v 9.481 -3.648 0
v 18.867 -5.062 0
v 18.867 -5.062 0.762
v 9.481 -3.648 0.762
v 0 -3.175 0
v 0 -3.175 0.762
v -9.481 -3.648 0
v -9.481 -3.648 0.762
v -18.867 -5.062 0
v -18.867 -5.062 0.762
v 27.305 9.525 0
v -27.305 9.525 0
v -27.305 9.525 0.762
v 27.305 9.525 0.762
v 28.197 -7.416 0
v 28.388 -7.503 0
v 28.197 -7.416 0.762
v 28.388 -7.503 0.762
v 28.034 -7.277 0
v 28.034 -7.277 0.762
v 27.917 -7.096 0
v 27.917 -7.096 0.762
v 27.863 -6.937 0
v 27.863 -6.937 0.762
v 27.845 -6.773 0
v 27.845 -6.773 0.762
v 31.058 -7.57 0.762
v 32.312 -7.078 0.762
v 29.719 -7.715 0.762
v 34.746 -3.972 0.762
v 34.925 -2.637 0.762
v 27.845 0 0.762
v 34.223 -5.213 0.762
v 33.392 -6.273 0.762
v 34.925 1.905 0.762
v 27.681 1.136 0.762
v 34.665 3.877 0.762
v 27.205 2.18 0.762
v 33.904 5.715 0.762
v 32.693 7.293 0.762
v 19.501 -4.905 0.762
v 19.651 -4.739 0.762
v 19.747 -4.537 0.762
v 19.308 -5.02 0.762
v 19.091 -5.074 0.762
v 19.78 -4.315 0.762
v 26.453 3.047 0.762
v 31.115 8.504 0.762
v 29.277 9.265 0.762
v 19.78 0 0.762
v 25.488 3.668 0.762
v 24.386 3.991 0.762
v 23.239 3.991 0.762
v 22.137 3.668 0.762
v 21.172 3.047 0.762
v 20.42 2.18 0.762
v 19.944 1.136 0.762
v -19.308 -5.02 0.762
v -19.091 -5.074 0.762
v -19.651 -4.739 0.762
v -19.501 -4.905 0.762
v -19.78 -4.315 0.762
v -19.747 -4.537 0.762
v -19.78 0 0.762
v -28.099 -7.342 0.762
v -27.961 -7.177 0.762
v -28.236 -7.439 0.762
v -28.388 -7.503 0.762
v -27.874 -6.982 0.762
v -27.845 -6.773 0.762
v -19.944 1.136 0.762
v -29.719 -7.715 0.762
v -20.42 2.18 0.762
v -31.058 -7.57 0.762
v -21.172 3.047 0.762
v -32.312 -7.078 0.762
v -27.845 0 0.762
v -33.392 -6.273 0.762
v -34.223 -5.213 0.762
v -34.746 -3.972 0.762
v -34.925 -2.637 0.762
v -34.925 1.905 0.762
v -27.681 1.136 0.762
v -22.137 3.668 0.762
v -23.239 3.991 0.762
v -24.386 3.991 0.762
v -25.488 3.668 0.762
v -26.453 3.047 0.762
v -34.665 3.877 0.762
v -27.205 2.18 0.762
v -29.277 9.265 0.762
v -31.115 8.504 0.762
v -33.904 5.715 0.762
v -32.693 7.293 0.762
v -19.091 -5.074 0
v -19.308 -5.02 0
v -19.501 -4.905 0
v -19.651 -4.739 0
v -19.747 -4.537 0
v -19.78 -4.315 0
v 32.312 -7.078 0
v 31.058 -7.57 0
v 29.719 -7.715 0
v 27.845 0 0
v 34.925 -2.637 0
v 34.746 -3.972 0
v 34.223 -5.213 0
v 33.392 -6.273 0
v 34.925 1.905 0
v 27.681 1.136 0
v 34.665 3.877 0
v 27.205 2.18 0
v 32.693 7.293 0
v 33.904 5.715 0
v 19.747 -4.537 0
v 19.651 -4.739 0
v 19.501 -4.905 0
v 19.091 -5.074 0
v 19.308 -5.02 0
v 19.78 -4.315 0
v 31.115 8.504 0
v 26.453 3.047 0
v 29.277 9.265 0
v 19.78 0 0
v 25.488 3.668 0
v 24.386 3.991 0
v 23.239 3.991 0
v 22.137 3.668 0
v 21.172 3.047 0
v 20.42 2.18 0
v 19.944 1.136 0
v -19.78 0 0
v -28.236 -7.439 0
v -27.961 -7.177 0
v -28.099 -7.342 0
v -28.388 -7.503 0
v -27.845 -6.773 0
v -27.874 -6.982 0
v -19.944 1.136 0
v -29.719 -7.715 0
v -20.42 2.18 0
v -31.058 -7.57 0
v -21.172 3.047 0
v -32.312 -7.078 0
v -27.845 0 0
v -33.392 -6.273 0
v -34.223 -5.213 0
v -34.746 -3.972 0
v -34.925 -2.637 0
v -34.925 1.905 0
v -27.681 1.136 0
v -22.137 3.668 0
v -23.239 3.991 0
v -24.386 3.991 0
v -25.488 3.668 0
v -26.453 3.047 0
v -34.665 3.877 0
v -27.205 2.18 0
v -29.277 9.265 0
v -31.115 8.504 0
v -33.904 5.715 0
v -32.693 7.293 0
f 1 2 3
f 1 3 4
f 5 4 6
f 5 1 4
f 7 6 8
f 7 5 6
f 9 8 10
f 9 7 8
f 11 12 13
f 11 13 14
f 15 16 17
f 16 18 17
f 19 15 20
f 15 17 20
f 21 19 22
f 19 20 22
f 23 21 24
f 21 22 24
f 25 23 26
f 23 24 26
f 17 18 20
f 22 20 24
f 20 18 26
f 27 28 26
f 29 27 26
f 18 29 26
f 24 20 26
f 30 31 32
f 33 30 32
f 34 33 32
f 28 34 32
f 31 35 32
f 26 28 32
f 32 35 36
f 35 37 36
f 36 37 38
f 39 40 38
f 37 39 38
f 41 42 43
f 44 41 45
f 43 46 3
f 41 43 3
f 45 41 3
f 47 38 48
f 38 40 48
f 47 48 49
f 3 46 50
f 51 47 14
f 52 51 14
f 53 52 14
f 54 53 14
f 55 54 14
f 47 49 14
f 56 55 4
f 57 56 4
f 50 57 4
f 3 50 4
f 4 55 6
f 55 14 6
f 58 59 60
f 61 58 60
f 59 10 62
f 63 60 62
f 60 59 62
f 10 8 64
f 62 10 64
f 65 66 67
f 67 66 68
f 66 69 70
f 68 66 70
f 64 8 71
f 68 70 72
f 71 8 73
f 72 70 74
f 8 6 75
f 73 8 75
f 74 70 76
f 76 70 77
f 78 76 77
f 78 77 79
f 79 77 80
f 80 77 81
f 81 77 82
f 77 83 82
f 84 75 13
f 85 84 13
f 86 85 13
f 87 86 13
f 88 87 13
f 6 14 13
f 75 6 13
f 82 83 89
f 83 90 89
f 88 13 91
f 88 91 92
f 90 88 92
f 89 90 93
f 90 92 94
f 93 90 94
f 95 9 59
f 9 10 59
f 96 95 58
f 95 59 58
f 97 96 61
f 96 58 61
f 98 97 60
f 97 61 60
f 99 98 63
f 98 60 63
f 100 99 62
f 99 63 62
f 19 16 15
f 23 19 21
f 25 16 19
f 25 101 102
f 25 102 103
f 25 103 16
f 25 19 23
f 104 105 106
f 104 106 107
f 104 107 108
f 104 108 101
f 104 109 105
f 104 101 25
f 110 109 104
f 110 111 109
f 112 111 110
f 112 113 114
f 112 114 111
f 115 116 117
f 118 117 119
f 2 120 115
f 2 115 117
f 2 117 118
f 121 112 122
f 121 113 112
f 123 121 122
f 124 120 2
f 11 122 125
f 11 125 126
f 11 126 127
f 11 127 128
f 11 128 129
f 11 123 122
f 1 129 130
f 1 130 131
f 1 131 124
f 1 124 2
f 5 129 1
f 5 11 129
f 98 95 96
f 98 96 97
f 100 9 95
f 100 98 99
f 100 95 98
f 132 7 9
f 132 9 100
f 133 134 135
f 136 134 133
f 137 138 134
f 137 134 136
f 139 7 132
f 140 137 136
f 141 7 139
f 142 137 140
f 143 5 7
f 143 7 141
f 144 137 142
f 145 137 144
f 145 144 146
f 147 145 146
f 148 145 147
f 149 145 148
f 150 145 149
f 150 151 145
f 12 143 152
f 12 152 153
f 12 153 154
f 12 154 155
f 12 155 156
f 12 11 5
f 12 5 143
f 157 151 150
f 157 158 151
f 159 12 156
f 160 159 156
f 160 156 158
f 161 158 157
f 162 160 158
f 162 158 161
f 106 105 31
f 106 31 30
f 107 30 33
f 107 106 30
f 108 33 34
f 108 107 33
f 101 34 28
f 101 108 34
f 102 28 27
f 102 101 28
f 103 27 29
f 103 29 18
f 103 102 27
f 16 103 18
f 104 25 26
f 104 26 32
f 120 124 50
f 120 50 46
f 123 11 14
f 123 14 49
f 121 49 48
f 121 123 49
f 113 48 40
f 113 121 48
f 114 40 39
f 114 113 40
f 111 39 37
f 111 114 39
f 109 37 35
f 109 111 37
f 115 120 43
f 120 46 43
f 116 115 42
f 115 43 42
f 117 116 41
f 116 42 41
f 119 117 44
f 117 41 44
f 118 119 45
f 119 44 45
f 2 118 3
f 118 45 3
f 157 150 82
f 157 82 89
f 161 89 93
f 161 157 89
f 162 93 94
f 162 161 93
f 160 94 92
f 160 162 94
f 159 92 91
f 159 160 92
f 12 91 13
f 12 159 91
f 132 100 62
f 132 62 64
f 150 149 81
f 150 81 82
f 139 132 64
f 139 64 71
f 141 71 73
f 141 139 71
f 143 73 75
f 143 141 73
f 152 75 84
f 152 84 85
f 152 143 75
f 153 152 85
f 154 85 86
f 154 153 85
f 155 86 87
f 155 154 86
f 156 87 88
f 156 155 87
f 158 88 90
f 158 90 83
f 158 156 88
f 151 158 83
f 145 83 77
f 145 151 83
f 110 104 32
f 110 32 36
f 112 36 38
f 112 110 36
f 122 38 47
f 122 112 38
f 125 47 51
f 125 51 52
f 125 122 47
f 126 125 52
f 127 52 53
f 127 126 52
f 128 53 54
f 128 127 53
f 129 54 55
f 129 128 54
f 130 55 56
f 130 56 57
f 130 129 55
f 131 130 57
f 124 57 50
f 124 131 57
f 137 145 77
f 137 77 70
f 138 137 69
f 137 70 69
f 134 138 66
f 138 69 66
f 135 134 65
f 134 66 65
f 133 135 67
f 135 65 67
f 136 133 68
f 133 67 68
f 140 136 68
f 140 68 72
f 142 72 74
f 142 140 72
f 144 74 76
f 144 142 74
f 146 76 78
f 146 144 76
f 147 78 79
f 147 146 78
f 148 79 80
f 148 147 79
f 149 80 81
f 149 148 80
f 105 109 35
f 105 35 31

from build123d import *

# Parameters (mm, degrees)
BOSS_EXTRUDE1_DEPTH = 0.762
FILLET1_R           = 0.762


with BuildPart() as part:
    # Sketch1 → Boss-Extrude1 (new body)
    with BuildSketch(Plane.XY):
        with BuildLine():
            Line((-27.305, 9.525), (27.305, 9.525))
            ThreePointArc((27.305, 9.525), (32.693153673, 7.293153673), (34.925, 1.905))
            Line((34.925, 1.905), (34.925, -2.636770687))
            ThreePointArc((34.925, -2.636770687), (32.855798288, -6.728407727), (28.333860759, -7.486807614))
            ThreePointArc((28.333860759, -7.486807614), (28.089406783, -7.411002579), (27.84475, -7.335854667))
            Line((27.84475, -7.335854667), (27.84475, 0))
            ThreePointArc((27.84475, 0), (23.8125, 4.03225), (19.78025, 0))
            Line((19.78025, 0), (19.78025, -5.251483323))
            ThreePointArc((19.78025, -5.251483323), (0, -3.175), (-19.78025, -5.251483323))
            Line((-19.78025, -5.251483323), (-19.78025, 0))
            ThreePointArc((-19.78025, 0), (-23.8125, 4.03225), (-27.84475, 0))
            Line((-27.84475, 0), (-27.84475, -7.335854667))
            ThreePointArc((-27.84475, -7.335854667), (-28.089406783, -7.411002579), (-28.333860759, -7.486807614))
            ThreePointArc((-28.333860759, -7.486807614), (-32.855798288, -6.728407727), (-34.925, -2.636770687))
            Line((-34.925, -2.636770687), (-34.925, 1.905))
            ThreePointArc((-34.925, 1.905), (-32.693153673, 7.293153673), (-27.305, 9.525))
        make_face()
    extrude(amount=BOSS_EXTRUDE1_DEPTH)

    # Fillet1
    fillet1_edges = [part.edges().sort_by_distance(p)[0] for p in [
        (27.84475, -7.335854667, 0.381),
        (19.78025, -5.251483323, 0.381),
        (-19.78025, -5.251483323, 0.381),
        (-27.84475, -7.335854667, 0.381),
    ]]
    fillet(fillet1_edges, radius=FILLET1_R)


solid = part.part
